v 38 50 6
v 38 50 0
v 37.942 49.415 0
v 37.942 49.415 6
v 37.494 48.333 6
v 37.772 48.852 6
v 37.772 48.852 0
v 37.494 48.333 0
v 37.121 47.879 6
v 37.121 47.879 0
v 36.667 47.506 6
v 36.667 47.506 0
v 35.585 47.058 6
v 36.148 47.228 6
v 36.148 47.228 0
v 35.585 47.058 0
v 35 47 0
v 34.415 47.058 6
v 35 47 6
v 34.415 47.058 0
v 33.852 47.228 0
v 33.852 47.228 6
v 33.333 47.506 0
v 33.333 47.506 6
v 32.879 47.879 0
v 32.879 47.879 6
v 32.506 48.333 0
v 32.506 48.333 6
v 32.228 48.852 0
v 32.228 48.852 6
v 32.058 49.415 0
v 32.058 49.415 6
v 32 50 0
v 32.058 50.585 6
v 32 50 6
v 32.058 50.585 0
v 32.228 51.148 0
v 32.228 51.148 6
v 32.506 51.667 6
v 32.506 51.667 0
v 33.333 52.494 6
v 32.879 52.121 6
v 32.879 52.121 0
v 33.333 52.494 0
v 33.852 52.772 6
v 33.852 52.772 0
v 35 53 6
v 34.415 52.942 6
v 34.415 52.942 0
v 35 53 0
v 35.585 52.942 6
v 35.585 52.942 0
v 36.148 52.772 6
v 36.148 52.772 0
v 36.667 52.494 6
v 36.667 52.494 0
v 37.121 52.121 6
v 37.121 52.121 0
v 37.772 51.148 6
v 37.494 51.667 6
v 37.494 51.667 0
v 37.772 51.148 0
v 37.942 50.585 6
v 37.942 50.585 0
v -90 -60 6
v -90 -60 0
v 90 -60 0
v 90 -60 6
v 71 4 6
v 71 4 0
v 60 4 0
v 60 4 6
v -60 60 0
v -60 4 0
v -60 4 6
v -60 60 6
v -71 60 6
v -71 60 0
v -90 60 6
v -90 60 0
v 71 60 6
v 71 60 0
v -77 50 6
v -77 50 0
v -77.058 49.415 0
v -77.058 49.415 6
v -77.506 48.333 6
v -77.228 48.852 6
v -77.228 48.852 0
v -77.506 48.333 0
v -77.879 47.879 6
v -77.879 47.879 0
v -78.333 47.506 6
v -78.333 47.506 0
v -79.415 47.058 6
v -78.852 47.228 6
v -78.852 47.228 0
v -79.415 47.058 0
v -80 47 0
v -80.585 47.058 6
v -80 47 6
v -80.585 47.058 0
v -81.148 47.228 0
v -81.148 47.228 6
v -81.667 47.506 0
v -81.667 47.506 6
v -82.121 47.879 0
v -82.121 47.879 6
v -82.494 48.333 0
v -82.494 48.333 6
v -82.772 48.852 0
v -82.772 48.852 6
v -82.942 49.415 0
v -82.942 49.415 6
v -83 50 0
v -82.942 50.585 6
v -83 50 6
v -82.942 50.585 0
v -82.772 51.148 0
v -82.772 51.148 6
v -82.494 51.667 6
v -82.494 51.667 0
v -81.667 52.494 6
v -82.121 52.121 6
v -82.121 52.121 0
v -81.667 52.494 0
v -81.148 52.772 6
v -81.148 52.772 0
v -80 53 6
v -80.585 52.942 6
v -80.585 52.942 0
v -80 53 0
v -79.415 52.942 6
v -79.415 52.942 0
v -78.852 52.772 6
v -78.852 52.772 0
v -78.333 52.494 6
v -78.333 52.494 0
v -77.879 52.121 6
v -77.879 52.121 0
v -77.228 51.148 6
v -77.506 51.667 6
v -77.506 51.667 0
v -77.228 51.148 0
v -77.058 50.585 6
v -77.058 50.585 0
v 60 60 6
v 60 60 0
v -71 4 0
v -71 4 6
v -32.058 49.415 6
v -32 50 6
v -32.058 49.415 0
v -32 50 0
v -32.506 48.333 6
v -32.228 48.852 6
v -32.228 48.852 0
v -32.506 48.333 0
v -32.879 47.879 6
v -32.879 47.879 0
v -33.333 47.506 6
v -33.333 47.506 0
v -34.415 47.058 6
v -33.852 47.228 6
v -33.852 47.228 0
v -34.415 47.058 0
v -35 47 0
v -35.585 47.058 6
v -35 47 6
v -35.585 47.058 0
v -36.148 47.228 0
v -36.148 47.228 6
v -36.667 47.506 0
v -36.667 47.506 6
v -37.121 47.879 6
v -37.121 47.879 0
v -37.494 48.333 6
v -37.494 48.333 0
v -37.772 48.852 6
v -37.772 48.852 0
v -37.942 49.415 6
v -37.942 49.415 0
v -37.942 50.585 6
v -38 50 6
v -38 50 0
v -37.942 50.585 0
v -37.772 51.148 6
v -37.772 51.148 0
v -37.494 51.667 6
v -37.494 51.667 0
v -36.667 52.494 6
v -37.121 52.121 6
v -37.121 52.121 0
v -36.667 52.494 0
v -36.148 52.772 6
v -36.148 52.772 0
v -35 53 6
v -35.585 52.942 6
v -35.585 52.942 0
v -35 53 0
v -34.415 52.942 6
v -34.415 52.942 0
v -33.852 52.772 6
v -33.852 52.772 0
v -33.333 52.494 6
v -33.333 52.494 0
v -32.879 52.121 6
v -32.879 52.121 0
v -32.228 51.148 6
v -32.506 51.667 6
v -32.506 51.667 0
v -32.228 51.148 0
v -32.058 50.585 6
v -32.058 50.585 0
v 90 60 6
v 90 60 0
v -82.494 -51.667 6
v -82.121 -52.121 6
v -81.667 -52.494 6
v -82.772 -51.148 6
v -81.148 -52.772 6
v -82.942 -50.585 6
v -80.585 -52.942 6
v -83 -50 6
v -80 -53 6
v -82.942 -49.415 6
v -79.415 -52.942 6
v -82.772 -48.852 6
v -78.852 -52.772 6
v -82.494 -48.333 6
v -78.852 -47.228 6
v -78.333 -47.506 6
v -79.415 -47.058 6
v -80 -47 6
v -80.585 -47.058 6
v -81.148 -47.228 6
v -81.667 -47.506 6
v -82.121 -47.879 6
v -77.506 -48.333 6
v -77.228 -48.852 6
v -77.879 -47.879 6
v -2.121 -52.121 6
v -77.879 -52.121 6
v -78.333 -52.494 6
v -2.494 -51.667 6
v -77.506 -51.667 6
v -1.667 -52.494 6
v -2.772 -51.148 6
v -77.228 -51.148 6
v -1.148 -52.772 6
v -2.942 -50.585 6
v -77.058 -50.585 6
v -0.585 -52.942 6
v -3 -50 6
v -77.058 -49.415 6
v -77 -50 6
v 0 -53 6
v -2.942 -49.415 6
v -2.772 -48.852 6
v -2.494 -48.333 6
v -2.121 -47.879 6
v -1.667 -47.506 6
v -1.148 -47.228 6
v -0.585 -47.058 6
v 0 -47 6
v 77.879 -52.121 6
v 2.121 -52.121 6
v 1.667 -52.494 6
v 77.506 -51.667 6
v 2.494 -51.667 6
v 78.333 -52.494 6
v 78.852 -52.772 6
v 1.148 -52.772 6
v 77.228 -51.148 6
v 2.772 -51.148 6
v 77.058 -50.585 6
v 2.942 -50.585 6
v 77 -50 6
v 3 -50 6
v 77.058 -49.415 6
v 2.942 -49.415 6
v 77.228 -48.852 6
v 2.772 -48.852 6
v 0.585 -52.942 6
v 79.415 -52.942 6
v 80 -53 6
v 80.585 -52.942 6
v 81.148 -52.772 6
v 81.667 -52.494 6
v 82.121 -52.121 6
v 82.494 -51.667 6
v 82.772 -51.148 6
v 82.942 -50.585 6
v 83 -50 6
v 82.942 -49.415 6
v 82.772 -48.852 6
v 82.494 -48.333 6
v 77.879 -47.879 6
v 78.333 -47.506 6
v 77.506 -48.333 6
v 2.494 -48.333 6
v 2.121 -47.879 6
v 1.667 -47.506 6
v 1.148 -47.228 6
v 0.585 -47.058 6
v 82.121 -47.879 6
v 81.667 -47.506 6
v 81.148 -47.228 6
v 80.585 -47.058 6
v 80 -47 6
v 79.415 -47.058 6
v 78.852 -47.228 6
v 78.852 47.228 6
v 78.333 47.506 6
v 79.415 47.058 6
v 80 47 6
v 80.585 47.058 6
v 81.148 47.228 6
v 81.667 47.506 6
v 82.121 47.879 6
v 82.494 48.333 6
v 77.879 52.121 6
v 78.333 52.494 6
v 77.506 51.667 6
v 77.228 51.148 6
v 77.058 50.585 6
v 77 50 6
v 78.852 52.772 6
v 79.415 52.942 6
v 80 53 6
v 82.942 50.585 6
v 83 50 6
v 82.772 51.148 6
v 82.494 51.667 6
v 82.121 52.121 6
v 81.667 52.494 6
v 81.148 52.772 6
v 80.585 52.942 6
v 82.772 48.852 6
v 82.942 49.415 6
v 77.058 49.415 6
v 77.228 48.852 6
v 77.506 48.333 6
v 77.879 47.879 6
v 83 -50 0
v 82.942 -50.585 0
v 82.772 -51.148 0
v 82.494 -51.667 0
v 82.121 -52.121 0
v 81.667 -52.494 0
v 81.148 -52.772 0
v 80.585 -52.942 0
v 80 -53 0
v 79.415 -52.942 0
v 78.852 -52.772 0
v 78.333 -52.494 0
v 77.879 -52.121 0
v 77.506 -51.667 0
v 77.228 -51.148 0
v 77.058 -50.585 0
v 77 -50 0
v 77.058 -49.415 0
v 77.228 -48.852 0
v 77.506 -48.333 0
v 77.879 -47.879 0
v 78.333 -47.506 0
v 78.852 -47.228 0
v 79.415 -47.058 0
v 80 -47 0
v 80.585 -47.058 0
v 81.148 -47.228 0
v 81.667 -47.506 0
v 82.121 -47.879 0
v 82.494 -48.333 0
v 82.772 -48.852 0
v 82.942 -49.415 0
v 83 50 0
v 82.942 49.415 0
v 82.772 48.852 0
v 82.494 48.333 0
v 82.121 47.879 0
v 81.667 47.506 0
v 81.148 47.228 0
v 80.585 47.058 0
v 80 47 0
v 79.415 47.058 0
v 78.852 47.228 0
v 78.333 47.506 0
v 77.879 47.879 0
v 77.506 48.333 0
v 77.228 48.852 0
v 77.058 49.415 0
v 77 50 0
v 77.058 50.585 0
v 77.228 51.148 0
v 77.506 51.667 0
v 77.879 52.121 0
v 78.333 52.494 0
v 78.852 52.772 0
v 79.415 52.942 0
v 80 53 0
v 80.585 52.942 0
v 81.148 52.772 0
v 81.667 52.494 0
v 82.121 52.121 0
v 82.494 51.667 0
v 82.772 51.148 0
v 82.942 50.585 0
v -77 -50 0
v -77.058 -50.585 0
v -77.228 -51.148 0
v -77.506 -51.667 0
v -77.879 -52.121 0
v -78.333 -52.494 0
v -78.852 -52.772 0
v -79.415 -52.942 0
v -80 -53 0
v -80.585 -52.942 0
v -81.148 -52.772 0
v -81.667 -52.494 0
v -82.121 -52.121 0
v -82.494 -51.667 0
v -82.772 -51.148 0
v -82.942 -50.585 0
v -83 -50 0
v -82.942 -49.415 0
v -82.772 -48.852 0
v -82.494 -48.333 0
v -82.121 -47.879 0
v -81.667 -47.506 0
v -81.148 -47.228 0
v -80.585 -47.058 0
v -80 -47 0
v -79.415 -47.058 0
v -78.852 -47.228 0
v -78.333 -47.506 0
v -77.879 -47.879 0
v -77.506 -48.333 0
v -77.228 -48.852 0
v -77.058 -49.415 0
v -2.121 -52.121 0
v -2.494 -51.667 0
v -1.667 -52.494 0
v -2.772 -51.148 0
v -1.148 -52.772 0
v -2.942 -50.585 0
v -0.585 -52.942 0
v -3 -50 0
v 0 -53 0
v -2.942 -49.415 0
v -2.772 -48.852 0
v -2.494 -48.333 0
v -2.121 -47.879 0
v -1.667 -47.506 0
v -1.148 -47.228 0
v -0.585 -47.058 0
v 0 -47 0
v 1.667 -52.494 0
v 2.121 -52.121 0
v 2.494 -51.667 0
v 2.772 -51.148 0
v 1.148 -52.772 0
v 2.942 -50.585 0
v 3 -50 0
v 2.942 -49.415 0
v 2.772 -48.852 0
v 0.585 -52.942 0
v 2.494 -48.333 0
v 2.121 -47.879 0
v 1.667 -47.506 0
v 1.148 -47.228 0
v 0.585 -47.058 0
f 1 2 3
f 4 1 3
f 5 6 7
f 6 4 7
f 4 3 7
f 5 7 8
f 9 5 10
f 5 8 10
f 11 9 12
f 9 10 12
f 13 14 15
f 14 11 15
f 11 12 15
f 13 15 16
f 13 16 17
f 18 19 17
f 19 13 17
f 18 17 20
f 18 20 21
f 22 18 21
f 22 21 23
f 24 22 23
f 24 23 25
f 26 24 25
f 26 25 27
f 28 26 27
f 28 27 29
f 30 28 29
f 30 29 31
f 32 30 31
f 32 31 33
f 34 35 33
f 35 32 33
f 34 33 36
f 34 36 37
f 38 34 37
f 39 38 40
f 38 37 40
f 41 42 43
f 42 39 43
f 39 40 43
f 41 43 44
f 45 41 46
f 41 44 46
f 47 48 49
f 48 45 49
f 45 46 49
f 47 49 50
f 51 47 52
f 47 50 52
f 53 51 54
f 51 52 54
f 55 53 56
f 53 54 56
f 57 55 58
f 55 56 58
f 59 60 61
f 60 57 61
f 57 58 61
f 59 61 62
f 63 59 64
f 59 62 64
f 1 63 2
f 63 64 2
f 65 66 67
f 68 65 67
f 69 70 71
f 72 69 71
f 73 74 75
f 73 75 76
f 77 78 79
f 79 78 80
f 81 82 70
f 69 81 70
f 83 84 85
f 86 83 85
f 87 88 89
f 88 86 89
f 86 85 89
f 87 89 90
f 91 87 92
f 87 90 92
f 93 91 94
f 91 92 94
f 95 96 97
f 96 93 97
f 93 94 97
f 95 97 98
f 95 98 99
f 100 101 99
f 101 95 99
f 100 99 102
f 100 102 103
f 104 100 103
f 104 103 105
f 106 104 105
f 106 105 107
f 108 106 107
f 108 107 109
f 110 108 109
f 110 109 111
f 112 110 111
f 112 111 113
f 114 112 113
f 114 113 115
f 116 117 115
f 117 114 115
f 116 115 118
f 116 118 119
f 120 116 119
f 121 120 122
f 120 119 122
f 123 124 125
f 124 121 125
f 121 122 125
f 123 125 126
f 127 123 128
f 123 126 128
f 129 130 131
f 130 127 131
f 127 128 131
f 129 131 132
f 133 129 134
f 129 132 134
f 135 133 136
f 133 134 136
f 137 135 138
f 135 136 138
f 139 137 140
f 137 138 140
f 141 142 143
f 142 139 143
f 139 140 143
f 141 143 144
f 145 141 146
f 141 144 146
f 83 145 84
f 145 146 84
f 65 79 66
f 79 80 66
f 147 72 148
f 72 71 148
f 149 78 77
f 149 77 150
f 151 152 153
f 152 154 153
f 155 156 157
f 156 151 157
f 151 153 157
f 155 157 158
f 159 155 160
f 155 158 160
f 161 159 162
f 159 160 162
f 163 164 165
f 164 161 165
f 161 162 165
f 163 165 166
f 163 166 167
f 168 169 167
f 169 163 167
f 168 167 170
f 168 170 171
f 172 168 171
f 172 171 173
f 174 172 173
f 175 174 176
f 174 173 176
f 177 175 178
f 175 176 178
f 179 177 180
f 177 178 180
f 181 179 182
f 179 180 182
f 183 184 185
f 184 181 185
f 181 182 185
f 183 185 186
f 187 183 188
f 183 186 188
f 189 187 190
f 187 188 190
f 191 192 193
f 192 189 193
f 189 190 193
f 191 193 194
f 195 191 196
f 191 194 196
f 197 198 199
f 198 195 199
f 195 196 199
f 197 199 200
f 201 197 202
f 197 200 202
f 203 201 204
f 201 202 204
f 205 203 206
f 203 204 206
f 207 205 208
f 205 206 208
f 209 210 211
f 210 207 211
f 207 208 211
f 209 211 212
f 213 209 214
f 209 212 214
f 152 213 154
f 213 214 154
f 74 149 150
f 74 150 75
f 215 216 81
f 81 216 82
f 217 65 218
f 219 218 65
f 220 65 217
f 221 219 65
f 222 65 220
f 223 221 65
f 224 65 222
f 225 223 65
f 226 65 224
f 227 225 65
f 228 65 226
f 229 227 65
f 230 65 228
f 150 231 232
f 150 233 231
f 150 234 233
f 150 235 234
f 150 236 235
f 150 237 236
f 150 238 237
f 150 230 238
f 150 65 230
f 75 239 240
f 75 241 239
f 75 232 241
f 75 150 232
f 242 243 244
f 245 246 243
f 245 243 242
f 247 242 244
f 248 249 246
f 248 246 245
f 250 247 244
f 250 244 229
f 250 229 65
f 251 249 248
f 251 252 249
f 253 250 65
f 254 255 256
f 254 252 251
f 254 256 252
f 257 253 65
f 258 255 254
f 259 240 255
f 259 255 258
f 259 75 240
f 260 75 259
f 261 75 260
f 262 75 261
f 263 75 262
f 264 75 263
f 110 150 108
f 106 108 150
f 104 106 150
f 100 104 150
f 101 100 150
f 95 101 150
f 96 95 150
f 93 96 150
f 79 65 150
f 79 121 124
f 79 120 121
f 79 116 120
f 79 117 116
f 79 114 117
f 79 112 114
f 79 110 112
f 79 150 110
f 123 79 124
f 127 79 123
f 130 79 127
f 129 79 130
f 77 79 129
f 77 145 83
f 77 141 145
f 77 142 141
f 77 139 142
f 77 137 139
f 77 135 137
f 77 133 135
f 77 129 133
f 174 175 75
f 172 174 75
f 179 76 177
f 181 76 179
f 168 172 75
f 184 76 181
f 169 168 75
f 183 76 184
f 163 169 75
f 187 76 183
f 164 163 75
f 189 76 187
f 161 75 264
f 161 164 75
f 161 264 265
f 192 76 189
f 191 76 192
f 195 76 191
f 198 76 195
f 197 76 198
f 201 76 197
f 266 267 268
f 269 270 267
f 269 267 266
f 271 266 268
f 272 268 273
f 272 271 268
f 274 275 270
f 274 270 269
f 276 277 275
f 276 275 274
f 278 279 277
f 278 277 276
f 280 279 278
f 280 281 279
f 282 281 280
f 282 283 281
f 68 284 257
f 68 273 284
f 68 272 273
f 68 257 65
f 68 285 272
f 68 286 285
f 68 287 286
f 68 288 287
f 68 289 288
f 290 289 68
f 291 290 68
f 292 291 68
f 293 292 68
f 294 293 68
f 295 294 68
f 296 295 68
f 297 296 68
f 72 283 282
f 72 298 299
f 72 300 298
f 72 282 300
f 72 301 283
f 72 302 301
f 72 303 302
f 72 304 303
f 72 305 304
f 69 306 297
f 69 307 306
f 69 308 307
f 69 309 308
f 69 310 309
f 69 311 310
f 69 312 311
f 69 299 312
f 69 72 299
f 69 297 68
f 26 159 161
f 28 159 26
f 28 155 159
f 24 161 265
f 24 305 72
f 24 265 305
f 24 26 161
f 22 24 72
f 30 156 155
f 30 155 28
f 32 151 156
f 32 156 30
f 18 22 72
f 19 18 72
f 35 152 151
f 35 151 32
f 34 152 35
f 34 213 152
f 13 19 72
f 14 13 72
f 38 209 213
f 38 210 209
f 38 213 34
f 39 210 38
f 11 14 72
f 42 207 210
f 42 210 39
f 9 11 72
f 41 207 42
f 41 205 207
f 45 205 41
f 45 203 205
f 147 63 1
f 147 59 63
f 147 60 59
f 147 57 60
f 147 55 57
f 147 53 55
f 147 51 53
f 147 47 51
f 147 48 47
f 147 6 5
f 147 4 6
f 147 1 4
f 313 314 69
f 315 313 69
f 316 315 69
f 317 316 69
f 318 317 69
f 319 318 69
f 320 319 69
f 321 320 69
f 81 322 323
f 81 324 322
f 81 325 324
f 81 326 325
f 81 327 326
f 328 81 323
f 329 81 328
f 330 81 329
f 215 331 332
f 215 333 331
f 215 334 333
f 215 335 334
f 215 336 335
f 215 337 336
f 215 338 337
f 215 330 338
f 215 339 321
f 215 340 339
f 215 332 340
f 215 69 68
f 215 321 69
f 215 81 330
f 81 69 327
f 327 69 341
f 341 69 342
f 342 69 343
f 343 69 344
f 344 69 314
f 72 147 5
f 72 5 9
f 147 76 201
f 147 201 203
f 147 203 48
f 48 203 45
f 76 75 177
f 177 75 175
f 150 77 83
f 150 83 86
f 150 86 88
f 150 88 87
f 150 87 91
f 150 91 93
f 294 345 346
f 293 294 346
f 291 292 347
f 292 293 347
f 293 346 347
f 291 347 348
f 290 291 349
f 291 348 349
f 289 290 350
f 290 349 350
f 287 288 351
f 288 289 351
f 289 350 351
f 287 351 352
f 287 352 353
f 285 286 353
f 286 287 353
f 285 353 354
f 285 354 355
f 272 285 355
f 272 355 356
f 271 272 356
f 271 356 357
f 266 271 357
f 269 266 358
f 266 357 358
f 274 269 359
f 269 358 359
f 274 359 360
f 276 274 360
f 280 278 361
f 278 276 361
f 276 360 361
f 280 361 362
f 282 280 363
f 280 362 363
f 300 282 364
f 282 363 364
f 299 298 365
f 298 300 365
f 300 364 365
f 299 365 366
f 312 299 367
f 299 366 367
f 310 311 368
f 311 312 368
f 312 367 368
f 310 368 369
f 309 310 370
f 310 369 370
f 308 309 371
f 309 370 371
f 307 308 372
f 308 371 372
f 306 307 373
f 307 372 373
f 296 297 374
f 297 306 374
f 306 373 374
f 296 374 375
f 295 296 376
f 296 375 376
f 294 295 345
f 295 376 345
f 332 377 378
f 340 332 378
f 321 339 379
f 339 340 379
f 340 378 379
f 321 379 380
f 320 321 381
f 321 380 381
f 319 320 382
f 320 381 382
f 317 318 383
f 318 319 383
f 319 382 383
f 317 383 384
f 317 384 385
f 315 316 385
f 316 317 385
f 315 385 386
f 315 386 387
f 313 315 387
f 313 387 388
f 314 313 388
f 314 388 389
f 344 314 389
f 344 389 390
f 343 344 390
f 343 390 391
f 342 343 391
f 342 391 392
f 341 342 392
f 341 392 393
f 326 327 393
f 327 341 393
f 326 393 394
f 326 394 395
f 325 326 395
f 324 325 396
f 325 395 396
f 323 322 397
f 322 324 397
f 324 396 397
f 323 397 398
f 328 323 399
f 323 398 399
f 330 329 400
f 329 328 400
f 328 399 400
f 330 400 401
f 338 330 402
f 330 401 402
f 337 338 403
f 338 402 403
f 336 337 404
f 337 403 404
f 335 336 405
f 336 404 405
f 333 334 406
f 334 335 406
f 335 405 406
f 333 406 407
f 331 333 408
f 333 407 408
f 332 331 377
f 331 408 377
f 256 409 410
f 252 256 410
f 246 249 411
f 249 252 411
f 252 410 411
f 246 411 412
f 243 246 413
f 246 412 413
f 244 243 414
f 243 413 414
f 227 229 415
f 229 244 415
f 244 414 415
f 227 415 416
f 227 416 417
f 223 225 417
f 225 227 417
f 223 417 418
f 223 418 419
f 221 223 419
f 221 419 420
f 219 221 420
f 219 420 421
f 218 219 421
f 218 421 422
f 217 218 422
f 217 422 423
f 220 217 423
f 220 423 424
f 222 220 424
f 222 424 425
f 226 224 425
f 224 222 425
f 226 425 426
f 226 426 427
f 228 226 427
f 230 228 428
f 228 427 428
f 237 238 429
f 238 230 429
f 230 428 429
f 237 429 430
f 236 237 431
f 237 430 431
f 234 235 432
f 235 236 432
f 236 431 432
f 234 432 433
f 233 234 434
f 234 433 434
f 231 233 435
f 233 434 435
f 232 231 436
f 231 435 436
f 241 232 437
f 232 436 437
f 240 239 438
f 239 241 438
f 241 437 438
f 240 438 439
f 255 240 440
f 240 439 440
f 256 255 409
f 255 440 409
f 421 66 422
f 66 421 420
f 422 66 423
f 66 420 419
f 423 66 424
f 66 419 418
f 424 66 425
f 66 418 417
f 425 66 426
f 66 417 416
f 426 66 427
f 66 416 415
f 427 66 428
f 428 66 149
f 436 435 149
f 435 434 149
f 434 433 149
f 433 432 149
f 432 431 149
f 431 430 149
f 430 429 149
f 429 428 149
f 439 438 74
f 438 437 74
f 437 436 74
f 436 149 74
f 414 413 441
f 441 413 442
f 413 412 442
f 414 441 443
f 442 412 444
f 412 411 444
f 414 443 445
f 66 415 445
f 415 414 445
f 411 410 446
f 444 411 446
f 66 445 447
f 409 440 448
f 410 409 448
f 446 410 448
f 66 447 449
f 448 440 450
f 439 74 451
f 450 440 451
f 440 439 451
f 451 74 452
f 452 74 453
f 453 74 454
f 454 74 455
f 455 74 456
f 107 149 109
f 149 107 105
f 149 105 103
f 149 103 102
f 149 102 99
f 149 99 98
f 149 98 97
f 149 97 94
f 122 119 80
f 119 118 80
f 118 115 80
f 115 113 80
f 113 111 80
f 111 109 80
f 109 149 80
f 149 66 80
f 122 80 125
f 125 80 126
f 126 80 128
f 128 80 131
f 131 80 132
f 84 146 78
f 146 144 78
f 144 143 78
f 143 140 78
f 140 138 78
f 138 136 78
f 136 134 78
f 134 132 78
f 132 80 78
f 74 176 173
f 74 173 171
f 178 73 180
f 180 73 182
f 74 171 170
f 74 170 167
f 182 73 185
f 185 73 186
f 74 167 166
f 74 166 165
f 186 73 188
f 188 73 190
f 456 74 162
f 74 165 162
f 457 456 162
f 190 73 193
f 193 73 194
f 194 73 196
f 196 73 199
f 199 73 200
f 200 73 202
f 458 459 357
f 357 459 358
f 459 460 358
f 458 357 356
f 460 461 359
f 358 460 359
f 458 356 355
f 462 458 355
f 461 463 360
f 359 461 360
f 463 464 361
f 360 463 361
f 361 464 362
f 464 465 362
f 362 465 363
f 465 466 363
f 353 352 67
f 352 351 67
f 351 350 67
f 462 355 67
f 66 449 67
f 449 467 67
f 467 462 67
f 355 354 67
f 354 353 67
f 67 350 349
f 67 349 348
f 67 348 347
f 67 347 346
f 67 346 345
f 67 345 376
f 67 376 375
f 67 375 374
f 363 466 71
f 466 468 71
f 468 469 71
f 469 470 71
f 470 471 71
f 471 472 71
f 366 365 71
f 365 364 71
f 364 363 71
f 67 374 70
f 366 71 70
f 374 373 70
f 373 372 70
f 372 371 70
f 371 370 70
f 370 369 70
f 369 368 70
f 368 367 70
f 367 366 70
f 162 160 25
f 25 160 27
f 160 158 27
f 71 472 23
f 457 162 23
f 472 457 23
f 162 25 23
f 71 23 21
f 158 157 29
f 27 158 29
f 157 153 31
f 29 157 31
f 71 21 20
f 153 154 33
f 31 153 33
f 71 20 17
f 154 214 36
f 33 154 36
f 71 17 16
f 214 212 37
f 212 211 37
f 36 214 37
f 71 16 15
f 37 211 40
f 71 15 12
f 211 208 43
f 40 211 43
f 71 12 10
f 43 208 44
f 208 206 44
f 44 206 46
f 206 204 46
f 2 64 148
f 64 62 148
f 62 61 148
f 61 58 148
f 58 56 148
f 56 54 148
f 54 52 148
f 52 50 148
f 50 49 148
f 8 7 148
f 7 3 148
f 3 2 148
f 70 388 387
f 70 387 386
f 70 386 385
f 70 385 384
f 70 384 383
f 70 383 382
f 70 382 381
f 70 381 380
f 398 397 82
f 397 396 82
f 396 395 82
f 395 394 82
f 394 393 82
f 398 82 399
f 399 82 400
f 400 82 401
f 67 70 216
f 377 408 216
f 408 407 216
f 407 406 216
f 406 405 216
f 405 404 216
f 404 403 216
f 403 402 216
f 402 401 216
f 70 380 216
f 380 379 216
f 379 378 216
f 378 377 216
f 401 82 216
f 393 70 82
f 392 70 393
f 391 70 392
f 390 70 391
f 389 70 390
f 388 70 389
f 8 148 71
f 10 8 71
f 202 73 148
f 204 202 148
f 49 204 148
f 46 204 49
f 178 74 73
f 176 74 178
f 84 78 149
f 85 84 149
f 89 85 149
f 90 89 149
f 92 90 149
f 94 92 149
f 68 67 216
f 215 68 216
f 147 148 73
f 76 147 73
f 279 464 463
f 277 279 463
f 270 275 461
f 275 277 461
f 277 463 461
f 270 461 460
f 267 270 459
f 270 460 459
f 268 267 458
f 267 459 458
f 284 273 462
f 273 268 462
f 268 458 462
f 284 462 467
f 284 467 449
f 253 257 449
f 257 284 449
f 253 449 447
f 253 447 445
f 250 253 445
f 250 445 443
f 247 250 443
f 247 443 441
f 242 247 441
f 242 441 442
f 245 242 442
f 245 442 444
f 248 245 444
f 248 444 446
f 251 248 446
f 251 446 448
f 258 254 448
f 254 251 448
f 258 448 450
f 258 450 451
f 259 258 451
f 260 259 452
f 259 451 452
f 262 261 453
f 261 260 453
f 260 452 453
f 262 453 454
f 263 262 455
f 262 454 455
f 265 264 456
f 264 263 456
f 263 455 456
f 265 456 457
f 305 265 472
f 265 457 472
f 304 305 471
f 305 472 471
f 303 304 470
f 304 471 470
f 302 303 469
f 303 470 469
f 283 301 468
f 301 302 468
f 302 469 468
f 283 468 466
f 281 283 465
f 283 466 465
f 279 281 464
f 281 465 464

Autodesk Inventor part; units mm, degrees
ref_plane "YZ Plane" through (0, 0, 0) normal (1, 0, 0) x (0, 1, 0)
ref_plane "XZ Plane" through (0, 0, 0) normal (0, 1, 0) x (-1, 0, 0)
ref_plane "XY Plane" through (0, 0, 0) normal (0, 0, 1) x (1, 0, 0)
sketch "Sketch1" plane through (0, 0, 0) normal (0, 0, 1) x (1, 0, 0)
  line L0 (-70, 40) -> (70, 40) construction
  line L1 (70, 40) -> (70, -40) construction
  line L2 (70, -40) -> (-70, -40) construction
  line L3 (-70, -40) -> (-70, 40) construction
  line L4 (90, 60) -> (-90, 60)
  line L5 (-90, 60) -> (-90, -60)
  line L6 (-90, -60) -> (90, -60)
  line L7 (90, -60) -> (90, 60)
  circle A0 centre (80, 50) radius 3
  circle A1 centre (-80, 50) radius 3
  circle A2 centre (-80, -50) radius 3
  circle A3 centre (0, -50) radius 3
  circle A4 centre (80, -50) radius 3
  line L8 (-90, 0) -> (90, 0) construction
  line L9 (0, 60) -> (0, -60) construction
  line L10 (-71, 60) -> (-71, 4)
  line L11 (-71, 4) -> (-60, 4)
  line L12 (-60, 4) -> (-60, 60)
  line L13 (71, 60) -> (71, 4)
  line L14 (71, 4) -> (60, 4)
  line L15 (60, 4) -> (60, 60)
  circle A5 centre (-35, 50) radius 3
  circle A6 centre (35, 50) radius 3
  point P0 (0, 0)
  point P1 (0, 40)
  point P2 (70, 0)
  point P3 (-70, 0)
  point P4 (0, 0)
  dimension "d0" = 140
  dimension "d1" = 80
  dimension "d2" = 20
  dimension "d7" = 6
  dimension "d8" = 10
  dimension "d9" = 10
  dimension "d17" = 56
  dimension "d18" = 11
  dimension "d19" = 1
  dimension "d20" = 10
  dimension "d21" = 35
extrude "Extrusion3" add sketch "Sketch1" along normal blind 6 contours L7 L6 L5 L4 L10 L11 L12 L15 L14 L13
properties part number "bottom"
